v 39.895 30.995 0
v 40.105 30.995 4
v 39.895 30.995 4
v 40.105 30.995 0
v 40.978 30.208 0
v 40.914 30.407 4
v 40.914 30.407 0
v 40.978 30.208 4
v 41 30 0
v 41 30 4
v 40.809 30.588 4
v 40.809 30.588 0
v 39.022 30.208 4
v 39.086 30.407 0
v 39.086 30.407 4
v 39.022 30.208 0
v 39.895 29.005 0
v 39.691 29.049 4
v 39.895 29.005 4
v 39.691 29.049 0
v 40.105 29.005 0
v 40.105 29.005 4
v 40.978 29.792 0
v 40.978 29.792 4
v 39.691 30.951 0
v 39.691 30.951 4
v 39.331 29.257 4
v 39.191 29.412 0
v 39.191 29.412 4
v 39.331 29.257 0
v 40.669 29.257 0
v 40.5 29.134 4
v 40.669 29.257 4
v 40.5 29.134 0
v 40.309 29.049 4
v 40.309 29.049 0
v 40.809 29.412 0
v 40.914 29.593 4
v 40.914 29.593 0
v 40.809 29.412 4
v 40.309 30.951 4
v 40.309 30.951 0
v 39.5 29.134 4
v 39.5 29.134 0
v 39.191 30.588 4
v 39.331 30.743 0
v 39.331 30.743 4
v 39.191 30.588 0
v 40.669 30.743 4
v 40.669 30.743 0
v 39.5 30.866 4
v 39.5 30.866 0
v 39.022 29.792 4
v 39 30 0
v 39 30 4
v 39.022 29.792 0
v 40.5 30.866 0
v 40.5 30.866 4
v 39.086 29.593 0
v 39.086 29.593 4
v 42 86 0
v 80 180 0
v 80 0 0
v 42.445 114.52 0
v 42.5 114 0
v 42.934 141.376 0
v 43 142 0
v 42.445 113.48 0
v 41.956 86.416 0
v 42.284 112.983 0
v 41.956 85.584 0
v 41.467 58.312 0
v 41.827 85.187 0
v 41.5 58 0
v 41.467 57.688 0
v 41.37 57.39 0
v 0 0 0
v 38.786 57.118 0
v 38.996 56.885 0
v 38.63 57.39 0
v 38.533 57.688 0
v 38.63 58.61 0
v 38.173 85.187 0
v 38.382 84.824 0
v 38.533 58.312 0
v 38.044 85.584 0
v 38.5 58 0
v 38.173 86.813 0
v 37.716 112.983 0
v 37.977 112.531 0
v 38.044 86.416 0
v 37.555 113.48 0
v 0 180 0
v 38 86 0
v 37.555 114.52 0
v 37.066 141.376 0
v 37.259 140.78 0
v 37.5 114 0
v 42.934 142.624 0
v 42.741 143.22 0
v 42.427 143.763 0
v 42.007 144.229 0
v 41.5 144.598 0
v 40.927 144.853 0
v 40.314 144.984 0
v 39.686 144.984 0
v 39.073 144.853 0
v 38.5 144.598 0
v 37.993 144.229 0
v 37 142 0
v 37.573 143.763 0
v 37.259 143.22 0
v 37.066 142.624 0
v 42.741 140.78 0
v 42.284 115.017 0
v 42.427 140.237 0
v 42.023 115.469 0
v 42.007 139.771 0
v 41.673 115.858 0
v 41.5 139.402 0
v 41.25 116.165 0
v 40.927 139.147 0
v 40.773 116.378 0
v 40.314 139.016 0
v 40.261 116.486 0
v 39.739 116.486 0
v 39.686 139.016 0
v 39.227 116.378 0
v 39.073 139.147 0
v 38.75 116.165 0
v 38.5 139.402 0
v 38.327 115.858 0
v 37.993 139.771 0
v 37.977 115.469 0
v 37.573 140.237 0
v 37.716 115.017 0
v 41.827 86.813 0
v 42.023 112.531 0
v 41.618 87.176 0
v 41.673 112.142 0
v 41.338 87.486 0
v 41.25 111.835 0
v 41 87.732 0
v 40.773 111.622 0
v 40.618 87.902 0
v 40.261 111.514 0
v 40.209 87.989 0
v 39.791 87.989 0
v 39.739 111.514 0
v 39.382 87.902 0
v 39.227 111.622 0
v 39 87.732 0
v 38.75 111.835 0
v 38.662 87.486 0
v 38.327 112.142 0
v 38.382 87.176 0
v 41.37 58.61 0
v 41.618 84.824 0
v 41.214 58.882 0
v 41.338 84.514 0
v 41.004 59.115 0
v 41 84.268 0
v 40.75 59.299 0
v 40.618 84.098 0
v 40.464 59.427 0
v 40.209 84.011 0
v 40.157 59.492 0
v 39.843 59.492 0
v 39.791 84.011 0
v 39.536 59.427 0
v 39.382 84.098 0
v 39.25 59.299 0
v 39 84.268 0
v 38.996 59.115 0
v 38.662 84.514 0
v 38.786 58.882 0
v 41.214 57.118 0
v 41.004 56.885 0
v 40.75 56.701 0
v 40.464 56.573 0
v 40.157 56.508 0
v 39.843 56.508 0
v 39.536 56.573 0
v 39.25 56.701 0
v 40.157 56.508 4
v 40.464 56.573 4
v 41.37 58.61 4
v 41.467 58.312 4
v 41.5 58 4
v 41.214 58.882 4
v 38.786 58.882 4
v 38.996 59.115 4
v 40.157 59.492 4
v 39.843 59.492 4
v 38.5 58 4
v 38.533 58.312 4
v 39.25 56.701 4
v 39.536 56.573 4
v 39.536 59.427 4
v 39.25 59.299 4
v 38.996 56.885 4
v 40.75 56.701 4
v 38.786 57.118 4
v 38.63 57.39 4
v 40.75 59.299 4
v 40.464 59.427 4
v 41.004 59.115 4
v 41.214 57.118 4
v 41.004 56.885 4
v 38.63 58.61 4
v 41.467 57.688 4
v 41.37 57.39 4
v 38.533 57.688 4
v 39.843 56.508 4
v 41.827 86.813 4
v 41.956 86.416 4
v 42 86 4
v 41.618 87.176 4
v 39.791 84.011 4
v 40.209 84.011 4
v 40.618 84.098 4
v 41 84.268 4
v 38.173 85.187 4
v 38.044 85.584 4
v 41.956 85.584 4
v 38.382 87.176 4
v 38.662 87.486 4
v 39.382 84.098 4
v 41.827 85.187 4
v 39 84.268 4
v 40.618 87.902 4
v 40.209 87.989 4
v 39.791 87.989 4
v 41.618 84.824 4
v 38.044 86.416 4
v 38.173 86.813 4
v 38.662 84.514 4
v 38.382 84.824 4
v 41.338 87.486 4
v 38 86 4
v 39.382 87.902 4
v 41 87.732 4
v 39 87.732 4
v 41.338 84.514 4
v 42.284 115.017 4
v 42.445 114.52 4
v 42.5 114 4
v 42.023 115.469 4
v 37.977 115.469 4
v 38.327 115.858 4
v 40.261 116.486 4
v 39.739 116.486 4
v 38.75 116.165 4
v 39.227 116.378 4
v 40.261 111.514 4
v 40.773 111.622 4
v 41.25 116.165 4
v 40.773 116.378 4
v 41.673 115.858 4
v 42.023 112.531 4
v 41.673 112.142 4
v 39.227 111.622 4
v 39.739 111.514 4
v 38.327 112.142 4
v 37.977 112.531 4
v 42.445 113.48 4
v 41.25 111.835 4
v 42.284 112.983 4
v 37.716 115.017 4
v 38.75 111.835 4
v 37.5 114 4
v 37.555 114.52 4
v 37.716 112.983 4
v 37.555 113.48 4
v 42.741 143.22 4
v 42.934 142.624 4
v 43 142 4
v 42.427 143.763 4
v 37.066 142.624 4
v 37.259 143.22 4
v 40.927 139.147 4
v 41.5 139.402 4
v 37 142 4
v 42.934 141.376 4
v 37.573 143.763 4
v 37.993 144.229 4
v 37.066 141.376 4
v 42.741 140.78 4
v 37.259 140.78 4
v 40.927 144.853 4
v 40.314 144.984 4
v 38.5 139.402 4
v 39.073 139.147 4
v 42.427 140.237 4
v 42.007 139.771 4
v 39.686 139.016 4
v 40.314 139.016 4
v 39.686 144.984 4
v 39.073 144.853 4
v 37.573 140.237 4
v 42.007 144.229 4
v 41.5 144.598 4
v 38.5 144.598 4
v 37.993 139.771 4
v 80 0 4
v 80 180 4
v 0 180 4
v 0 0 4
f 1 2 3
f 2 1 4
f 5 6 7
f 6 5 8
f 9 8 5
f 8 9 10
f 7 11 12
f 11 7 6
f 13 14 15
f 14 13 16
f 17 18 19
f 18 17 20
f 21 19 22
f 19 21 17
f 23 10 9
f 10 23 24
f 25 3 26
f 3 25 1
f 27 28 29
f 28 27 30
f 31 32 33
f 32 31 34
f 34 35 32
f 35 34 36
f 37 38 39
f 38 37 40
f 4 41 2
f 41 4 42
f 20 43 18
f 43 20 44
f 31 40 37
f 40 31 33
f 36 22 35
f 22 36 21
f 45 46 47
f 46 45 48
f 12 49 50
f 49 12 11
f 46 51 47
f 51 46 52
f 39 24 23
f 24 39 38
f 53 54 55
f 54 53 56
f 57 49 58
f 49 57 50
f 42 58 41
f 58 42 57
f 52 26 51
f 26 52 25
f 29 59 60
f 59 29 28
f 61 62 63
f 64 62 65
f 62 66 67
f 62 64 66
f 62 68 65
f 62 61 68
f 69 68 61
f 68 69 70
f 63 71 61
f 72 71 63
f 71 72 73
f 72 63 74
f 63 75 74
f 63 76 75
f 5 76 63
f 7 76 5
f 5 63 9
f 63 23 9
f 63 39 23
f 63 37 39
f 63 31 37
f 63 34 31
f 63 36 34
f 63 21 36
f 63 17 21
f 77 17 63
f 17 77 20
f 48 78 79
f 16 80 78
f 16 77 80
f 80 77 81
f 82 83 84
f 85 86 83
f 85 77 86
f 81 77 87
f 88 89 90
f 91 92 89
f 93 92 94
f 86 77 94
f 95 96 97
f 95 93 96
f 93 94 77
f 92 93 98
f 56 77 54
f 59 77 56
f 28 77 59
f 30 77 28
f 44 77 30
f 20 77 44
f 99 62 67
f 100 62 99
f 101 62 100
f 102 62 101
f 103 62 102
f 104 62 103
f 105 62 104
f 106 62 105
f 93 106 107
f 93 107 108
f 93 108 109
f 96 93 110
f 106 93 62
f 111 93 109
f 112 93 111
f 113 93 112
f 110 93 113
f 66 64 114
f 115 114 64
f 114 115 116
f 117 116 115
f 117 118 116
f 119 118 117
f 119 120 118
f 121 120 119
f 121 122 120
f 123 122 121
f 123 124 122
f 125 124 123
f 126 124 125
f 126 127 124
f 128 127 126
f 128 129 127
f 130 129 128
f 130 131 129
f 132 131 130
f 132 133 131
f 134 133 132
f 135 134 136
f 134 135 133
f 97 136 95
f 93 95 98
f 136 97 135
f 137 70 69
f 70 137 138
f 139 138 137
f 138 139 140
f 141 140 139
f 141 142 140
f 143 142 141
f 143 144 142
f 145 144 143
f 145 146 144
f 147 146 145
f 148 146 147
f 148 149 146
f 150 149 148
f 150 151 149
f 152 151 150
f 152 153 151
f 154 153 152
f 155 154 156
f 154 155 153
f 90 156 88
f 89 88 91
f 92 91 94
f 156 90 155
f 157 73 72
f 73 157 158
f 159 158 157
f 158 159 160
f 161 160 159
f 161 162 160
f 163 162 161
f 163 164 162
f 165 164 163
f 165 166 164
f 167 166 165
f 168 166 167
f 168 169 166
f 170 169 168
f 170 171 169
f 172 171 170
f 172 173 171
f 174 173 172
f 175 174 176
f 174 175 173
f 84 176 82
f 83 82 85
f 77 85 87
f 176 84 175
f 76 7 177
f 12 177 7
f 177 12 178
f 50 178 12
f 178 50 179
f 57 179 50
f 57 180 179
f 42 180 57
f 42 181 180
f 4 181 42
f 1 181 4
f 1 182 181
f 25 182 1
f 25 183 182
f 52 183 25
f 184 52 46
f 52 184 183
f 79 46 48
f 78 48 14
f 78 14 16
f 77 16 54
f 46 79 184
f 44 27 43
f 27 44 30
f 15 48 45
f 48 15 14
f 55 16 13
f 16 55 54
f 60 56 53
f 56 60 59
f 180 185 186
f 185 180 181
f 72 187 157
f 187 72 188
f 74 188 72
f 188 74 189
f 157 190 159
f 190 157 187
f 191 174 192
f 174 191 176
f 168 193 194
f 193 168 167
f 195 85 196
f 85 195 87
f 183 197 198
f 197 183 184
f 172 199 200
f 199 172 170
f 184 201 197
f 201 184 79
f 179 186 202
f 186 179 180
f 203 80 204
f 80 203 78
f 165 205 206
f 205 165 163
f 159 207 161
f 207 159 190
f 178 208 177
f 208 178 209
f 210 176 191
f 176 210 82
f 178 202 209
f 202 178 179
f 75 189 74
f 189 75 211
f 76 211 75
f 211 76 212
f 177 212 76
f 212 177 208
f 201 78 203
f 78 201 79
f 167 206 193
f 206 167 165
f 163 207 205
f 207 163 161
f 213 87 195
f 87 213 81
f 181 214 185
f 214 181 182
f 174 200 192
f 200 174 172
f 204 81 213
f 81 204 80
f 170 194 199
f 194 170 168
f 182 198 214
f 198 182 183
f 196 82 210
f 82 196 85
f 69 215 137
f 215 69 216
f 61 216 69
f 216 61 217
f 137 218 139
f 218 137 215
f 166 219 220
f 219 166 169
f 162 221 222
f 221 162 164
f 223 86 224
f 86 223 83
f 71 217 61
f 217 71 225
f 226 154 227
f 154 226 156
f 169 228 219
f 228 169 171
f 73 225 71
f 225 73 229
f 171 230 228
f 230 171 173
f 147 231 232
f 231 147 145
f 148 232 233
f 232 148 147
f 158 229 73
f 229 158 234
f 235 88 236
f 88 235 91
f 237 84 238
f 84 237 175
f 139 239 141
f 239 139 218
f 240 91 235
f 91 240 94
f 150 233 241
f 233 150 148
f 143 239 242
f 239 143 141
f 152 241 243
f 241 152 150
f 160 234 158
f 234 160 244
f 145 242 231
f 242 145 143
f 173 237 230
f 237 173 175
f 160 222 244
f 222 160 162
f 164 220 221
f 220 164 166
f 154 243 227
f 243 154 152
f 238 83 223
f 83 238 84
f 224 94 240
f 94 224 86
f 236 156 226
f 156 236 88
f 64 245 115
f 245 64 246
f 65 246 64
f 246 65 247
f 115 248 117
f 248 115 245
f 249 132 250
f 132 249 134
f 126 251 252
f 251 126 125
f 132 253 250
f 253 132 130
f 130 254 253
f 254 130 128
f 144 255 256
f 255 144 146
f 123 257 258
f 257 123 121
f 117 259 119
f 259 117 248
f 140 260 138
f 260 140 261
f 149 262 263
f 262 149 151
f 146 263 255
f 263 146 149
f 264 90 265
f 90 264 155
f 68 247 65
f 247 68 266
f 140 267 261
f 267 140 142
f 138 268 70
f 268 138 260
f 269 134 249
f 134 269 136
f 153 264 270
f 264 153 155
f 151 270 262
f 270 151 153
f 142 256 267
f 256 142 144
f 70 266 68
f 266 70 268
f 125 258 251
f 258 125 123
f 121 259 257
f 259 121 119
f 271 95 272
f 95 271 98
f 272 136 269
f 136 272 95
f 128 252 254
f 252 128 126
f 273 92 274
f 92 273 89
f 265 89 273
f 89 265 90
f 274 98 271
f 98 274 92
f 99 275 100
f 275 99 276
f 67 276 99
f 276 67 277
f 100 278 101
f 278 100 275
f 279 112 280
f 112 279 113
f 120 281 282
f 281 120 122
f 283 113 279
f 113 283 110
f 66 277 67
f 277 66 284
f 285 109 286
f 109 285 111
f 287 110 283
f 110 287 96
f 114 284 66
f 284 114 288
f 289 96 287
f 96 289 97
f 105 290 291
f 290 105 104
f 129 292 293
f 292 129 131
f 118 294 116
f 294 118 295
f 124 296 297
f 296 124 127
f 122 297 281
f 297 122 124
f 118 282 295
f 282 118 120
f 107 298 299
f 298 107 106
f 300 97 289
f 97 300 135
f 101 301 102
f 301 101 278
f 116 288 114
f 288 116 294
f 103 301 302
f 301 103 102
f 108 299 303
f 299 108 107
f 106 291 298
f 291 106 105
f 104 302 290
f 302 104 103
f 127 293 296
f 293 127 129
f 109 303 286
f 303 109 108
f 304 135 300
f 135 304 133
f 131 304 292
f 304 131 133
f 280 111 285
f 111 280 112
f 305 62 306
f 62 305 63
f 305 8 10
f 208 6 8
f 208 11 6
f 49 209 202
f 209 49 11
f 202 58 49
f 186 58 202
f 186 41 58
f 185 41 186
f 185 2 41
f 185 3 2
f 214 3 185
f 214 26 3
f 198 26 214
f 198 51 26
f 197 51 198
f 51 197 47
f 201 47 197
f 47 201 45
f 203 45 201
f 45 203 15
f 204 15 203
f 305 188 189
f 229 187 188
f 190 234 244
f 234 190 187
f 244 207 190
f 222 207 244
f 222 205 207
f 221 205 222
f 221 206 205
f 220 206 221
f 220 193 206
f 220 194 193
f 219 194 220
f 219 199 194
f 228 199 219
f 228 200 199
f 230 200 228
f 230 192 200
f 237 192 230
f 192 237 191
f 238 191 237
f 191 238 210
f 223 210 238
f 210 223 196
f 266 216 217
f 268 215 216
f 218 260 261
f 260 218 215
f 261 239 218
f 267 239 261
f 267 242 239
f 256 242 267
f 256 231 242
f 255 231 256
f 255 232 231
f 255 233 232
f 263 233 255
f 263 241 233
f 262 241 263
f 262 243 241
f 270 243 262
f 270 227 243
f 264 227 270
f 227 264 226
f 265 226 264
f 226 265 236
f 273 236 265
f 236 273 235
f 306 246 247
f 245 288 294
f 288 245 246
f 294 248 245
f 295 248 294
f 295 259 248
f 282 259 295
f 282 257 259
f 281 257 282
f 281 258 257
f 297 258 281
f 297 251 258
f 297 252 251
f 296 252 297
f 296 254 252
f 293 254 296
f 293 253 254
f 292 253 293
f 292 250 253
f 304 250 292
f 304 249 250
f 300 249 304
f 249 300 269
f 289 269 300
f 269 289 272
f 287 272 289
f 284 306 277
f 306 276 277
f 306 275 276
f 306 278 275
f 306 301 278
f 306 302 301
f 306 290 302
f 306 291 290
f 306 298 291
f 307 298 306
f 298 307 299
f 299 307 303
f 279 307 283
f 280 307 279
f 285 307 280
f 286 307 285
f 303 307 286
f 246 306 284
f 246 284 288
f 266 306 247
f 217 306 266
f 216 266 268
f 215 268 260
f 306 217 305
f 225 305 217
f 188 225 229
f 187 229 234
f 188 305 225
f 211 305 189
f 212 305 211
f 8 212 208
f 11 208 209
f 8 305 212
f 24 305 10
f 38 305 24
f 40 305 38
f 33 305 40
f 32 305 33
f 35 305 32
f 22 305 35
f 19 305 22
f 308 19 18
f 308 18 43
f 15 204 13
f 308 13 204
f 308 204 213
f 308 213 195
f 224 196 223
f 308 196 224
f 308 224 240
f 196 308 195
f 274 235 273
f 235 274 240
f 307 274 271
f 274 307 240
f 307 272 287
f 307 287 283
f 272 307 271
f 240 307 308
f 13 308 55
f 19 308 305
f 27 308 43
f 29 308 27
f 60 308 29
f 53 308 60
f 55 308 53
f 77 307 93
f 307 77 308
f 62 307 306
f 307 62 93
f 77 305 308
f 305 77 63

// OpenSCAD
/*
Title: Pressure with Depth Board
Folder: 15_fluids_pressure
Physics Topic: Hydrostatic pressure
Difficulty: Beginner-Intermediate
Print Type: FDM, single material
Teaches: Conceptual mechanics
Use Case: Classroom manipulative
*/


// --------------------
// Parameters
// --------------------
board_w = 80;
board_h = 180;
thickness = 4;
port_diams = [2,3,4,5,6];

module pressure_board(){
    difference(){
        cube([board_w,board_h,thickness]);
        for(i=[0:len(port_diams)-1])
            translate([board_w/2,30+i*28,0]) cylinder(h=thickness+0.1,d=port_diams[i],$fn=30);
    }
}
pressure_board();
